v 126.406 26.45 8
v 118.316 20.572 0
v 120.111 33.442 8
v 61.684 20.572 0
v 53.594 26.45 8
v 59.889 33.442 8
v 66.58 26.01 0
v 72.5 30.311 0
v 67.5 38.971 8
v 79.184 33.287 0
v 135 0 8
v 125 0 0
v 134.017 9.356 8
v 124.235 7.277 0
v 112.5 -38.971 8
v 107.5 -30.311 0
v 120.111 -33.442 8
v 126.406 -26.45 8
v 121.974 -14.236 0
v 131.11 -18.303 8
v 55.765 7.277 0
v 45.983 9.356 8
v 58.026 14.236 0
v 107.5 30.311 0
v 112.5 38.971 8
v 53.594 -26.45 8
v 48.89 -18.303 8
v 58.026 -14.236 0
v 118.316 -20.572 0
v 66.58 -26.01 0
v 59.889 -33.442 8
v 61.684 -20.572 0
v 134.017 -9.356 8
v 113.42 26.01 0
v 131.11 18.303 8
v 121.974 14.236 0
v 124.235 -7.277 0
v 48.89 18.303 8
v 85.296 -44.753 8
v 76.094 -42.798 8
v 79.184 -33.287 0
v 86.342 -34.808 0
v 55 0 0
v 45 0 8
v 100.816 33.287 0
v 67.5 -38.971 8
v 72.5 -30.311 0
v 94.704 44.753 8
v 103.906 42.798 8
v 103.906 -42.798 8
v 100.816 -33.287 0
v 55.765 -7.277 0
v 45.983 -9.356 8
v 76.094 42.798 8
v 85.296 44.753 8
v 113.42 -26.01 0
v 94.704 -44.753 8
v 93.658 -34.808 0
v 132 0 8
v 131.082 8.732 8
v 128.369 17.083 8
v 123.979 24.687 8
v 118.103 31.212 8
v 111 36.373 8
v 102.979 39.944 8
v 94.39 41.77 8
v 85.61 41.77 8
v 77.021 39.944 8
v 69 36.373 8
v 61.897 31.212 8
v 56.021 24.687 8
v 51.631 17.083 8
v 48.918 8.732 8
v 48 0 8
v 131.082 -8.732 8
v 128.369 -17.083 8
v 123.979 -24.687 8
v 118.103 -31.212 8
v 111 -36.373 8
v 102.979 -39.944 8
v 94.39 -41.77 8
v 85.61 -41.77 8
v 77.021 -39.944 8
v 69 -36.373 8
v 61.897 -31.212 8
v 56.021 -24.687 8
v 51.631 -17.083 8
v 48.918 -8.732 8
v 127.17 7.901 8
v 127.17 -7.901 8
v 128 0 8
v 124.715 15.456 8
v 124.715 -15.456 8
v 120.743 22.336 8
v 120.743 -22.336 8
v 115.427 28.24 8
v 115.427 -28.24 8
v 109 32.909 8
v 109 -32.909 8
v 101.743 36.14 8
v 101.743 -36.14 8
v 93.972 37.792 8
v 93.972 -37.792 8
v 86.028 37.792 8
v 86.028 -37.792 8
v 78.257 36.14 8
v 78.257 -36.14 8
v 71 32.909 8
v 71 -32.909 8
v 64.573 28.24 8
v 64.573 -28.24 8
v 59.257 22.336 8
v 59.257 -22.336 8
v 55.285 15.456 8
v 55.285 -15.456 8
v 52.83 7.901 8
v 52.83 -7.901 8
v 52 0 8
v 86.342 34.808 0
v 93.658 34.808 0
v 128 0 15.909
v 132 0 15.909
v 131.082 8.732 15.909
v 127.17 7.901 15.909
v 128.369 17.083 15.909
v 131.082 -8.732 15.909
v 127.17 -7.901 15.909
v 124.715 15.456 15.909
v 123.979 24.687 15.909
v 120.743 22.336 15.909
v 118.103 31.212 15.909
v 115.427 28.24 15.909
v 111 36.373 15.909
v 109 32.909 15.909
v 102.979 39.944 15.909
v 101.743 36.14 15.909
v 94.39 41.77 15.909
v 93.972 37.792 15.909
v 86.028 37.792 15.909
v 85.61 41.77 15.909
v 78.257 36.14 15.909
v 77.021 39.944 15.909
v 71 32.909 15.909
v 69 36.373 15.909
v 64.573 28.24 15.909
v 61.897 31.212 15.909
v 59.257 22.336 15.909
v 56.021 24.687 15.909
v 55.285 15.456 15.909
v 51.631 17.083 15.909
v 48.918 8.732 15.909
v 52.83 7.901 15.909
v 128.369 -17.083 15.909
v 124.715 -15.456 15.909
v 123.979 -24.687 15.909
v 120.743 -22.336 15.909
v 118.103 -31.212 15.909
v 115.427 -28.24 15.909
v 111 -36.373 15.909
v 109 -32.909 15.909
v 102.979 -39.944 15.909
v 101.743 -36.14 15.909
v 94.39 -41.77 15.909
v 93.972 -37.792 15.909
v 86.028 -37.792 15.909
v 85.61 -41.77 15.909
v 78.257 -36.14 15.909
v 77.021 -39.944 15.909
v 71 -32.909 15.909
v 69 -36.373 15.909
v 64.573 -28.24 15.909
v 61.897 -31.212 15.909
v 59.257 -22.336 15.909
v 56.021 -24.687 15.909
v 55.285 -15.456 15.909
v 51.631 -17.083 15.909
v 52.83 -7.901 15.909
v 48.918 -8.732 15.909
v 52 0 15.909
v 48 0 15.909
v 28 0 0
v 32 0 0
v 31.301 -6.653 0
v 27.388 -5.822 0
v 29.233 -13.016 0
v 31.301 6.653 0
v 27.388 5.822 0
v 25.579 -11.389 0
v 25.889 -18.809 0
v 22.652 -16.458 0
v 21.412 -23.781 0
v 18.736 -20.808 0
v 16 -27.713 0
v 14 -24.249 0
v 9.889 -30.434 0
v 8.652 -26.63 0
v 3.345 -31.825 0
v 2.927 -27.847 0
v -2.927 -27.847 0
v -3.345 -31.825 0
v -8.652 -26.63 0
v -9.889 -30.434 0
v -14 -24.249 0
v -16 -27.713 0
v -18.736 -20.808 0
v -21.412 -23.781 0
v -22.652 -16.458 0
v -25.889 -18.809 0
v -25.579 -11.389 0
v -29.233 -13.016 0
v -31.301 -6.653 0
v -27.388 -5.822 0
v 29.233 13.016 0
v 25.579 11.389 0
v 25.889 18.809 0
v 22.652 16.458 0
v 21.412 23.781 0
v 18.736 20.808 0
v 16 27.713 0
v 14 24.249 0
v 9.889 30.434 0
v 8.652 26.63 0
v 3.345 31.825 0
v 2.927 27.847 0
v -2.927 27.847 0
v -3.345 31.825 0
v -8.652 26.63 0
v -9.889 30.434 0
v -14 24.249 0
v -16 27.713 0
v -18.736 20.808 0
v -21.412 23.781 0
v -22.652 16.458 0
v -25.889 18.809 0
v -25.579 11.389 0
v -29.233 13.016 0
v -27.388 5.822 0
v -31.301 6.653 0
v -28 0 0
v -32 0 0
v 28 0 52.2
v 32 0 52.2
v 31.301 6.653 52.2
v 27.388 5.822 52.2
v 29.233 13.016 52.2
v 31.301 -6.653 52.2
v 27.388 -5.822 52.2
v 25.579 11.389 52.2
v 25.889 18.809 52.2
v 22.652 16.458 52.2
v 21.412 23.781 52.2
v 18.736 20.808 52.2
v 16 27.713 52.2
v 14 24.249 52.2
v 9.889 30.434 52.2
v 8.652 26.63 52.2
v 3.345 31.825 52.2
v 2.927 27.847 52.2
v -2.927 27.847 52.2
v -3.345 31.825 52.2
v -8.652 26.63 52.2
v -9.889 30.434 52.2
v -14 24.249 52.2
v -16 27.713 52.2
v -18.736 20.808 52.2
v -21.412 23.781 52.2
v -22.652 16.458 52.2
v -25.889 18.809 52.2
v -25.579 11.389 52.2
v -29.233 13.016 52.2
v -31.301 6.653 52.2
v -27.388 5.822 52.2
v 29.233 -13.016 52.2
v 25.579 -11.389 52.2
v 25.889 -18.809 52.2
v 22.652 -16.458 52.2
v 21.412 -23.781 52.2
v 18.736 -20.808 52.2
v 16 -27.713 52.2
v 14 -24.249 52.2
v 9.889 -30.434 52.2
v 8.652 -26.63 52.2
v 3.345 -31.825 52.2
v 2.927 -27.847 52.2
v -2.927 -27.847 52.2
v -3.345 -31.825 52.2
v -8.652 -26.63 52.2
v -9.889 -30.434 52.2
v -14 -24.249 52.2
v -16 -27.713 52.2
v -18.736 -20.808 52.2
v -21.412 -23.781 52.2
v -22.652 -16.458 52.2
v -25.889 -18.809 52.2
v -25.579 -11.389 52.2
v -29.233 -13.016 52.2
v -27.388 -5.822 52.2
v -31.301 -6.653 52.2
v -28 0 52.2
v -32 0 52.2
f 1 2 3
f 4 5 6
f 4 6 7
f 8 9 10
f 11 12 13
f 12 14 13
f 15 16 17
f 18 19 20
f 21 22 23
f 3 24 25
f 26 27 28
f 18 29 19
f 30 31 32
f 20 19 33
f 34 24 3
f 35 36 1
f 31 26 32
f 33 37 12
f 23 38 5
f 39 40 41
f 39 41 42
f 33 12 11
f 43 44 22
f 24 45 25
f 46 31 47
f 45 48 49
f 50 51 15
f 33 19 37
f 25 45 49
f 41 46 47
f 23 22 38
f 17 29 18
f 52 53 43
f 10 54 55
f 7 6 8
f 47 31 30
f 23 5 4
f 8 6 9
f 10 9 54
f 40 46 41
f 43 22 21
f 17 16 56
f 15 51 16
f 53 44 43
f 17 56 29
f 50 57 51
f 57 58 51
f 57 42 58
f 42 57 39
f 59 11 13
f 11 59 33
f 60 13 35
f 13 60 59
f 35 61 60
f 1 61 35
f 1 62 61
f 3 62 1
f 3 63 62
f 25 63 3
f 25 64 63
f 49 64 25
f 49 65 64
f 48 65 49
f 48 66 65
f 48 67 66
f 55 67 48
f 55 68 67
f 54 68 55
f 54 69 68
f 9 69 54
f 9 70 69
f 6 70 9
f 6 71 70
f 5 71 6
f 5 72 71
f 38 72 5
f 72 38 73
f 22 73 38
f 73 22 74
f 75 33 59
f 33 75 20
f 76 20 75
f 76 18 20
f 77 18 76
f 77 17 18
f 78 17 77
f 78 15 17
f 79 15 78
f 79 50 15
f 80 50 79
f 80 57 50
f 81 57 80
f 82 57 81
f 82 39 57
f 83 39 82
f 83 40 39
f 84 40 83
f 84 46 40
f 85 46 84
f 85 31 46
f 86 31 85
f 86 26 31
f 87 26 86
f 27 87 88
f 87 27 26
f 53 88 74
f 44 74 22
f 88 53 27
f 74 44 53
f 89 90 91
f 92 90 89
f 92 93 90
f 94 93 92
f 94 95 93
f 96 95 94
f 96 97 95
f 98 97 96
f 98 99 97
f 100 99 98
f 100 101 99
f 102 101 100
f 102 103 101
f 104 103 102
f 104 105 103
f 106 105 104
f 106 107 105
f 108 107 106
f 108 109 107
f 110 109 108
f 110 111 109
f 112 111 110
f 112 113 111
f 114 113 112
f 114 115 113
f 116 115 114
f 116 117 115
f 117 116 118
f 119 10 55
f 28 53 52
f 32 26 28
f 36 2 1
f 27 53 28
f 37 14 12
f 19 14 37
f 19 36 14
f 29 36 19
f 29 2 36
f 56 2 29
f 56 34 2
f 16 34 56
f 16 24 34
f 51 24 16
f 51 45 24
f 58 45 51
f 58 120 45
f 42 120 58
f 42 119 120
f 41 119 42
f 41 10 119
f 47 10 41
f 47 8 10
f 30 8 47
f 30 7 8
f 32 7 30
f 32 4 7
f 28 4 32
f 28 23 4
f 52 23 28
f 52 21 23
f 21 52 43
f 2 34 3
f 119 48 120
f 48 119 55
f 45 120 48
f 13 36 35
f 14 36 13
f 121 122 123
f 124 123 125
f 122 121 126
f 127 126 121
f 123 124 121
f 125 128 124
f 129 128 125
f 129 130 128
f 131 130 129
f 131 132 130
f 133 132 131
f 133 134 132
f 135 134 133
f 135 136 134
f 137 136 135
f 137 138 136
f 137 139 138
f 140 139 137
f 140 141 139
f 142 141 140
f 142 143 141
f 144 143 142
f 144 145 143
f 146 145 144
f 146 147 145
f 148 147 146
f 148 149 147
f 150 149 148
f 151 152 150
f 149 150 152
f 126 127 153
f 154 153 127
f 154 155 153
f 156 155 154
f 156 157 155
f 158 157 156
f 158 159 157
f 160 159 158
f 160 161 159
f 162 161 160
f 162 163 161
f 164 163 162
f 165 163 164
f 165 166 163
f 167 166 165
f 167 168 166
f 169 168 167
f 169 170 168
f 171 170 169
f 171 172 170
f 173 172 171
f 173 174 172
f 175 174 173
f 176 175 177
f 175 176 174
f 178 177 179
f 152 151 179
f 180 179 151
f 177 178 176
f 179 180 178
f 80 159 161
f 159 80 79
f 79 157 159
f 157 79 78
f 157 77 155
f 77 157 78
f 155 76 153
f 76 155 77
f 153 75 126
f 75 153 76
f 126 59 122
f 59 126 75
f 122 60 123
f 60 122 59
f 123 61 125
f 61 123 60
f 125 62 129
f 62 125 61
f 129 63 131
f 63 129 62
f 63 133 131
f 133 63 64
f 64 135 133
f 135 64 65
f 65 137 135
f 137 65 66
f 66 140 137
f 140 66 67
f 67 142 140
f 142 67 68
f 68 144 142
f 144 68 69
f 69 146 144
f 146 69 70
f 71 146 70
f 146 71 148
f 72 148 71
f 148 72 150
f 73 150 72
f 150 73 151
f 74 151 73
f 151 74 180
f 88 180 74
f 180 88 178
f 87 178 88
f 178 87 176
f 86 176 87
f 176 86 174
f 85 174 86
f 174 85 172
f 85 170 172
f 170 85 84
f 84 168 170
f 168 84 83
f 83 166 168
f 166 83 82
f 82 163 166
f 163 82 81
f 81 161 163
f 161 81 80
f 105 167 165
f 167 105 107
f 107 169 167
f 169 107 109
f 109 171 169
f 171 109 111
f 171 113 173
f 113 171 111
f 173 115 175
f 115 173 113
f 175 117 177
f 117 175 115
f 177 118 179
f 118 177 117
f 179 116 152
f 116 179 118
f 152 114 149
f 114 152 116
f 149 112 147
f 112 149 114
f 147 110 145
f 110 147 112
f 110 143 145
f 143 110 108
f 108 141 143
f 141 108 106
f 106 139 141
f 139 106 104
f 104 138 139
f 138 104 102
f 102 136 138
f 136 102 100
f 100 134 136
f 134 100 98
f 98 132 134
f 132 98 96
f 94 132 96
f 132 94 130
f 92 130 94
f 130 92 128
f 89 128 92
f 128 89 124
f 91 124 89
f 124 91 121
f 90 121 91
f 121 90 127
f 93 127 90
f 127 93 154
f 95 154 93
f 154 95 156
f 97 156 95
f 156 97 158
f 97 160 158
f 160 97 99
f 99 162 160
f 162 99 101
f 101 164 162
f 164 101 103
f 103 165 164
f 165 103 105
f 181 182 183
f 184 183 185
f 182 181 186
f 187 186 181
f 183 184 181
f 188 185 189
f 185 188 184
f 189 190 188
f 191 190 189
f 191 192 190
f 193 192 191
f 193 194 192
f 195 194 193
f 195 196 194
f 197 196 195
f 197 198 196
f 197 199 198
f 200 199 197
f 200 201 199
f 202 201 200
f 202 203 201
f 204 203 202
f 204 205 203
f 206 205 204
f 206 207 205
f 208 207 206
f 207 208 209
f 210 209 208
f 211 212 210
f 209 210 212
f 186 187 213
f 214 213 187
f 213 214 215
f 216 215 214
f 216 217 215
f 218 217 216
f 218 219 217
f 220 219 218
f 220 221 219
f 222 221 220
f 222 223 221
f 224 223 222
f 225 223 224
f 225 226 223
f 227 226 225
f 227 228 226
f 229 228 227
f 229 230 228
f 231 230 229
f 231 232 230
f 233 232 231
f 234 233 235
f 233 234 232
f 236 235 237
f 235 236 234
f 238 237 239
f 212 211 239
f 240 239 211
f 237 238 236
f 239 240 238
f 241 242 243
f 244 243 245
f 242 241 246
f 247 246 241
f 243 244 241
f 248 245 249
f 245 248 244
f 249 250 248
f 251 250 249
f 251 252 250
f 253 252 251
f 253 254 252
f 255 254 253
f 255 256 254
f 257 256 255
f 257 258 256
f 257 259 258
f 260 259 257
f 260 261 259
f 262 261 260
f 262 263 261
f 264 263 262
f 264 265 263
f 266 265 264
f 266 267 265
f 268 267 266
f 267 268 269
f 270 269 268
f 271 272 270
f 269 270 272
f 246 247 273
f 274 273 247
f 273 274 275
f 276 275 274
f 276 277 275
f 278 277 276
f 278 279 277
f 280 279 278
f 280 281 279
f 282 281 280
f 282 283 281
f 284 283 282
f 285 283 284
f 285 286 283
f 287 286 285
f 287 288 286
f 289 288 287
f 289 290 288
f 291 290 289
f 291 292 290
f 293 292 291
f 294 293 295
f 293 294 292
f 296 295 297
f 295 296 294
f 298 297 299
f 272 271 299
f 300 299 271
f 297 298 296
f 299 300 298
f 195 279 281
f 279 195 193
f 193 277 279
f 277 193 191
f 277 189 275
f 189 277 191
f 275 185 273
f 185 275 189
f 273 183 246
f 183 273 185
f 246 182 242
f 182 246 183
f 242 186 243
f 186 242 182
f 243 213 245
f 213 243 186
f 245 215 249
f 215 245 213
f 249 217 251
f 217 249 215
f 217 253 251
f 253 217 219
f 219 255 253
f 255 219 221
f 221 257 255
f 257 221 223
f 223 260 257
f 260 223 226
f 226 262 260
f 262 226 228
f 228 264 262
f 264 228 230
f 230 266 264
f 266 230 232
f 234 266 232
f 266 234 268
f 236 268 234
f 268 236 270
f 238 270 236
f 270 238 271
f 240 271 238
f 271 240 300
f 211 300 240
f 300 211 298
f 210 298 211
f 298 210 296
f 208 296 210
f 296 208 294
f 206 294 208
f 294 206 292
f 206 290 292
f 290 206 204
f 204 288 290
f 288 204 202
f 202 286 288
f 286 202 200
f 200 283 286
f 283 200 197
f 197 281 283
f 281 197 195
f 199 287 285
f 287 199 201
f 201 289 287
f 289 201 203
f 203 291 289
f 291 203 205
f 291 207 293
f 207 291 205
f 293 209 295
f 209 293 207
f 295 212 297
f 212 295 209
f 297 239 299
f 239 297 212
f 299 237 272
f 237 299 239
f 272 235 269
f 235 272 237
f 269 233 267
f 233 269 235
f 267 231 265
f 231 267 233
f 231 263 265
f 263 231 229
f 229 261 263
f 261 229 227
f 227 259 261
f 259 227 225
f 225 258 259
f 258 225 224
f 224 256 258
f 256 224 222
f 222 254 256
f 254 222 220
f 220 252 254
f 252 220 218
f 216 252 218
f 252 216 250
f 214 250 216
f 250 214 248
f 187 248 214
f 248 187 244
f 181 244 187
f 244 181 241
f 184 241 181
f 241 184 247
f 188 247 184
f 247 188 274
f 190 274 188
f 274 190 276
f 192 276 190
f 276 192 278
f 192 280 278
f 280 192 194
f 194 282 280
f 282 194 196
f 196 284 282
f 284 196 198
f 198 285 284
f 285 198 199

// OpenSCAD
// [FL_INDEX: keywords="openscad, 3d_parametric, Customizable_Turret_2_0, csg_solid" | COT="Parametric OpenSCAD design from 3DCodeverse"]
// Title: Customizable Turret 2.0

//Created by Ari M. Diacou, February 2014
//Shared under Creative Commons License: Attribution 3.0 Unported (CC BY-SA 3.0) 
//see http://creativecommons.org/licenses/by-sa/3.0/

/* [Base] */
//A way to save your "random" arrangement
master_seed=13;
//Number of intersections forming a block
n=8;
//reduces the ablity of higher n to cut away all the block, I like -0.4.
power=-.4; //[-1,-0.9,-0.8,-0.7,-0.6,-0.5,-0.4,-0.3,-0.2,-0.1,0]
//Maximum angle of block intersections
max_angle=15;
//How many blocks form a circle?
blocks_per_rev=12;
//Number of layers of blocks in the turret base
height=6;
//The height of each block in mm
block_height=4;
//The radial width of a block in mm
block_thickness=10;
//The internal radius of the turret in mm
turret_radius=25;
//How much curviness do you want?
$fn=30;
//<1 Compresses layers, >1 expands them to show mortar
z_spacing=1.1;
//<1 Compresses layers, >1 expands them to show mortar
theta_expansion=1.0;
//Mortar thickeness divided by Block thickness, if you dont want, hit zero.
mortar_thickness=.4;

/* [Top] */
//Do you want a top?
care="yes";//[yes,no]
//Do 45 degree overhangs scare you?
noob="no";//[yes,no]
//How many blocks wide do you want the lookout stones?
factor=1.5;

/* [Hidden] */
stone="silver";
grout="ghostwhite";
rad=turret_radius;
num=blocks_per_rev;
union(){
	color(stone) base();
	if(mortar_thickness>.01){
		color(grout) 
			mortar(turret_radius,mortar_thickness);
		}
	}
if (care=="yes") {crown();}

module crown(){
	phase=360/num*(ceil(factor)-factor)/1;
	if(noob=="no"){
		translate([2*rad+4*block_thickness,0,3*block_height]) union(){
			//The conical base
			translate([0,0,-3*block_height]) 
				color(stone) cylinder(2*block_height,turret_radius+block_thickness,turret_radius+2*block_thickness);
			//The middle stones
			for(i=[1:num]){
				rotate( i * 360 / num, [0,0,1])	
					color(stone) wedge5(turret_radius+block_thickness,block_thickness,360/num,block_height, master_seed+i);
				}
			//The mortar
			if(mortar_thickness>.01){
				translate([0,0,-1*block_height])	
					scale([1,1,1/(height*z_spacing)])
						color(grout) mortar(turret_radius+block_thickness,mortar_thickness);
				}
			//The crenelations
			for(i=[1:num/2]){ 
				//Crenelations
				translate([0,0,2*block_height])	
					rotate( phase+i * 720 / num, [0,0,1])	
						color(stone) wedge5(turret_radius+block_thickness,block_thickness,(360*factor)/num,block_height,master_seed+num+i);
				}
			}
		}
	if(noob=="yes"){
		translate([2*rad+4*block_thickness,0,1*block_height]) union(){
			//The middle stones
			for(i=[1:num]){
				rotate( i * 360 / num, [0,0,1])	
					color(stone) wedge5(turret_radius+block_thickness,block_thickness,360/num,block_height, master_seed+i);
				}
			//The mortar
			translate([0,0,-1*block_height])	
				scale([1,1,1/(height*z_spacing)])
					color(grout) mortar(turret_radius+block_thickness,mortar_thickness);
			//The crenelations
			for(i=[1:num/2]){ 
				//Crenelations
				translate([0,0,2*block_height])	
					rotate( phase+i * 720 / num, [0,0,1])	
						color(stone) wedge5(turret_radius+block_thickness,block_thickness,(360*factor)/num,block_height,master_seed+num+i);
				}
			}
		//The conical base
		translate([0,2*rad+4*block_thickness,0])
			color(stone) cylinder(2*block_height,turret_radius+2*block_thickness,turret_radius+block_thickness);
		}
	}

module base(){
	for(h=[0:height-1]){
		rotate([0,0,90*(pow(-1,h))/num]) 
			translate([0,0,(h+.5)*block_height*2*z_spacing]) 
				union(){
					for(i=[1:num]){
					   rotate( i * 360 / num, [0,0,1])	
							wedge5(turret_radius,block_thickness,360*theta_expansion/num,block_height,master_seed+i+num*h);
						}
					}
		}
	}

module mortar(radius,thickness){
	//Makes a hollow cylinder in the middle of the bricks of the 
	inner_radius=radius+(1-thickness)*block_thickness/2;
	outer_radius=thickness*block_thickness;
	//translate([0,0,-block_height])
	linear_extrude(height=2*height*block_height*(z_spacing)-height*(z_spacing-1)){
		difference(){
			circle(inner_radius+outer_radius);
			circle(inner_radius);
			}
		}
	}

module wedge5(inner,width,theta,thickness,seed){
	//inner		=inner radius of arch/circle
	//width		=radial distance of block
	//theta		=angle subtended by block
	//thickness	=height of block
	random=rands(-1,1,n*3,seed);
	intersection(){
		wedge_boundary(inner,width,theta,thickness);
		correct(inner, width)	translate([inner+width/2,0,0])
			intersection_for(i=[0:n-1]){
				rotate([	max_angle*random[3*i]*pow(i*(thickness/inner),power),
							.7*max_angle*random[3*i+1]*pow(i,power),
							max_angle*random[3*i+2]*pow(i*(inner/width),power)])
					cube([width, sqrt((4*inner*tan(theta/2))*(width)), sqrt((4*inner*tan(theta/2))*(thickness))], center=true);
				}
		}	
	}

module correct(inner, width){
	//mirrors an object about its yz plane, which necessarily must be done is this ugly way
	translate([inner+width/2,0,0])
		mirror([1,0,0])
			translate([-inner-width/2,0,0])
				child(0);
	}

module wedge_boundary(inner,width,theta,thickness){
	//Creates a pie slice of theta degrees that has a radius of inner+width. Used to make sure that the wedge does not over-extend the angle it is supposed to.
	intersection(){
		rotate([0,0,-theta/2]) 
			translate([(inner+width)/2,(inner+width)/2,0])
				cube([inner+width,inner+width,2*thickness],center=true);
		rotate([0,0,theta/2]) 
			translate([(inner+width)/2,-(inner+width)/2,0])
				cube([inner+width,inner+width,2*thickness],center=true);
		}
	}
